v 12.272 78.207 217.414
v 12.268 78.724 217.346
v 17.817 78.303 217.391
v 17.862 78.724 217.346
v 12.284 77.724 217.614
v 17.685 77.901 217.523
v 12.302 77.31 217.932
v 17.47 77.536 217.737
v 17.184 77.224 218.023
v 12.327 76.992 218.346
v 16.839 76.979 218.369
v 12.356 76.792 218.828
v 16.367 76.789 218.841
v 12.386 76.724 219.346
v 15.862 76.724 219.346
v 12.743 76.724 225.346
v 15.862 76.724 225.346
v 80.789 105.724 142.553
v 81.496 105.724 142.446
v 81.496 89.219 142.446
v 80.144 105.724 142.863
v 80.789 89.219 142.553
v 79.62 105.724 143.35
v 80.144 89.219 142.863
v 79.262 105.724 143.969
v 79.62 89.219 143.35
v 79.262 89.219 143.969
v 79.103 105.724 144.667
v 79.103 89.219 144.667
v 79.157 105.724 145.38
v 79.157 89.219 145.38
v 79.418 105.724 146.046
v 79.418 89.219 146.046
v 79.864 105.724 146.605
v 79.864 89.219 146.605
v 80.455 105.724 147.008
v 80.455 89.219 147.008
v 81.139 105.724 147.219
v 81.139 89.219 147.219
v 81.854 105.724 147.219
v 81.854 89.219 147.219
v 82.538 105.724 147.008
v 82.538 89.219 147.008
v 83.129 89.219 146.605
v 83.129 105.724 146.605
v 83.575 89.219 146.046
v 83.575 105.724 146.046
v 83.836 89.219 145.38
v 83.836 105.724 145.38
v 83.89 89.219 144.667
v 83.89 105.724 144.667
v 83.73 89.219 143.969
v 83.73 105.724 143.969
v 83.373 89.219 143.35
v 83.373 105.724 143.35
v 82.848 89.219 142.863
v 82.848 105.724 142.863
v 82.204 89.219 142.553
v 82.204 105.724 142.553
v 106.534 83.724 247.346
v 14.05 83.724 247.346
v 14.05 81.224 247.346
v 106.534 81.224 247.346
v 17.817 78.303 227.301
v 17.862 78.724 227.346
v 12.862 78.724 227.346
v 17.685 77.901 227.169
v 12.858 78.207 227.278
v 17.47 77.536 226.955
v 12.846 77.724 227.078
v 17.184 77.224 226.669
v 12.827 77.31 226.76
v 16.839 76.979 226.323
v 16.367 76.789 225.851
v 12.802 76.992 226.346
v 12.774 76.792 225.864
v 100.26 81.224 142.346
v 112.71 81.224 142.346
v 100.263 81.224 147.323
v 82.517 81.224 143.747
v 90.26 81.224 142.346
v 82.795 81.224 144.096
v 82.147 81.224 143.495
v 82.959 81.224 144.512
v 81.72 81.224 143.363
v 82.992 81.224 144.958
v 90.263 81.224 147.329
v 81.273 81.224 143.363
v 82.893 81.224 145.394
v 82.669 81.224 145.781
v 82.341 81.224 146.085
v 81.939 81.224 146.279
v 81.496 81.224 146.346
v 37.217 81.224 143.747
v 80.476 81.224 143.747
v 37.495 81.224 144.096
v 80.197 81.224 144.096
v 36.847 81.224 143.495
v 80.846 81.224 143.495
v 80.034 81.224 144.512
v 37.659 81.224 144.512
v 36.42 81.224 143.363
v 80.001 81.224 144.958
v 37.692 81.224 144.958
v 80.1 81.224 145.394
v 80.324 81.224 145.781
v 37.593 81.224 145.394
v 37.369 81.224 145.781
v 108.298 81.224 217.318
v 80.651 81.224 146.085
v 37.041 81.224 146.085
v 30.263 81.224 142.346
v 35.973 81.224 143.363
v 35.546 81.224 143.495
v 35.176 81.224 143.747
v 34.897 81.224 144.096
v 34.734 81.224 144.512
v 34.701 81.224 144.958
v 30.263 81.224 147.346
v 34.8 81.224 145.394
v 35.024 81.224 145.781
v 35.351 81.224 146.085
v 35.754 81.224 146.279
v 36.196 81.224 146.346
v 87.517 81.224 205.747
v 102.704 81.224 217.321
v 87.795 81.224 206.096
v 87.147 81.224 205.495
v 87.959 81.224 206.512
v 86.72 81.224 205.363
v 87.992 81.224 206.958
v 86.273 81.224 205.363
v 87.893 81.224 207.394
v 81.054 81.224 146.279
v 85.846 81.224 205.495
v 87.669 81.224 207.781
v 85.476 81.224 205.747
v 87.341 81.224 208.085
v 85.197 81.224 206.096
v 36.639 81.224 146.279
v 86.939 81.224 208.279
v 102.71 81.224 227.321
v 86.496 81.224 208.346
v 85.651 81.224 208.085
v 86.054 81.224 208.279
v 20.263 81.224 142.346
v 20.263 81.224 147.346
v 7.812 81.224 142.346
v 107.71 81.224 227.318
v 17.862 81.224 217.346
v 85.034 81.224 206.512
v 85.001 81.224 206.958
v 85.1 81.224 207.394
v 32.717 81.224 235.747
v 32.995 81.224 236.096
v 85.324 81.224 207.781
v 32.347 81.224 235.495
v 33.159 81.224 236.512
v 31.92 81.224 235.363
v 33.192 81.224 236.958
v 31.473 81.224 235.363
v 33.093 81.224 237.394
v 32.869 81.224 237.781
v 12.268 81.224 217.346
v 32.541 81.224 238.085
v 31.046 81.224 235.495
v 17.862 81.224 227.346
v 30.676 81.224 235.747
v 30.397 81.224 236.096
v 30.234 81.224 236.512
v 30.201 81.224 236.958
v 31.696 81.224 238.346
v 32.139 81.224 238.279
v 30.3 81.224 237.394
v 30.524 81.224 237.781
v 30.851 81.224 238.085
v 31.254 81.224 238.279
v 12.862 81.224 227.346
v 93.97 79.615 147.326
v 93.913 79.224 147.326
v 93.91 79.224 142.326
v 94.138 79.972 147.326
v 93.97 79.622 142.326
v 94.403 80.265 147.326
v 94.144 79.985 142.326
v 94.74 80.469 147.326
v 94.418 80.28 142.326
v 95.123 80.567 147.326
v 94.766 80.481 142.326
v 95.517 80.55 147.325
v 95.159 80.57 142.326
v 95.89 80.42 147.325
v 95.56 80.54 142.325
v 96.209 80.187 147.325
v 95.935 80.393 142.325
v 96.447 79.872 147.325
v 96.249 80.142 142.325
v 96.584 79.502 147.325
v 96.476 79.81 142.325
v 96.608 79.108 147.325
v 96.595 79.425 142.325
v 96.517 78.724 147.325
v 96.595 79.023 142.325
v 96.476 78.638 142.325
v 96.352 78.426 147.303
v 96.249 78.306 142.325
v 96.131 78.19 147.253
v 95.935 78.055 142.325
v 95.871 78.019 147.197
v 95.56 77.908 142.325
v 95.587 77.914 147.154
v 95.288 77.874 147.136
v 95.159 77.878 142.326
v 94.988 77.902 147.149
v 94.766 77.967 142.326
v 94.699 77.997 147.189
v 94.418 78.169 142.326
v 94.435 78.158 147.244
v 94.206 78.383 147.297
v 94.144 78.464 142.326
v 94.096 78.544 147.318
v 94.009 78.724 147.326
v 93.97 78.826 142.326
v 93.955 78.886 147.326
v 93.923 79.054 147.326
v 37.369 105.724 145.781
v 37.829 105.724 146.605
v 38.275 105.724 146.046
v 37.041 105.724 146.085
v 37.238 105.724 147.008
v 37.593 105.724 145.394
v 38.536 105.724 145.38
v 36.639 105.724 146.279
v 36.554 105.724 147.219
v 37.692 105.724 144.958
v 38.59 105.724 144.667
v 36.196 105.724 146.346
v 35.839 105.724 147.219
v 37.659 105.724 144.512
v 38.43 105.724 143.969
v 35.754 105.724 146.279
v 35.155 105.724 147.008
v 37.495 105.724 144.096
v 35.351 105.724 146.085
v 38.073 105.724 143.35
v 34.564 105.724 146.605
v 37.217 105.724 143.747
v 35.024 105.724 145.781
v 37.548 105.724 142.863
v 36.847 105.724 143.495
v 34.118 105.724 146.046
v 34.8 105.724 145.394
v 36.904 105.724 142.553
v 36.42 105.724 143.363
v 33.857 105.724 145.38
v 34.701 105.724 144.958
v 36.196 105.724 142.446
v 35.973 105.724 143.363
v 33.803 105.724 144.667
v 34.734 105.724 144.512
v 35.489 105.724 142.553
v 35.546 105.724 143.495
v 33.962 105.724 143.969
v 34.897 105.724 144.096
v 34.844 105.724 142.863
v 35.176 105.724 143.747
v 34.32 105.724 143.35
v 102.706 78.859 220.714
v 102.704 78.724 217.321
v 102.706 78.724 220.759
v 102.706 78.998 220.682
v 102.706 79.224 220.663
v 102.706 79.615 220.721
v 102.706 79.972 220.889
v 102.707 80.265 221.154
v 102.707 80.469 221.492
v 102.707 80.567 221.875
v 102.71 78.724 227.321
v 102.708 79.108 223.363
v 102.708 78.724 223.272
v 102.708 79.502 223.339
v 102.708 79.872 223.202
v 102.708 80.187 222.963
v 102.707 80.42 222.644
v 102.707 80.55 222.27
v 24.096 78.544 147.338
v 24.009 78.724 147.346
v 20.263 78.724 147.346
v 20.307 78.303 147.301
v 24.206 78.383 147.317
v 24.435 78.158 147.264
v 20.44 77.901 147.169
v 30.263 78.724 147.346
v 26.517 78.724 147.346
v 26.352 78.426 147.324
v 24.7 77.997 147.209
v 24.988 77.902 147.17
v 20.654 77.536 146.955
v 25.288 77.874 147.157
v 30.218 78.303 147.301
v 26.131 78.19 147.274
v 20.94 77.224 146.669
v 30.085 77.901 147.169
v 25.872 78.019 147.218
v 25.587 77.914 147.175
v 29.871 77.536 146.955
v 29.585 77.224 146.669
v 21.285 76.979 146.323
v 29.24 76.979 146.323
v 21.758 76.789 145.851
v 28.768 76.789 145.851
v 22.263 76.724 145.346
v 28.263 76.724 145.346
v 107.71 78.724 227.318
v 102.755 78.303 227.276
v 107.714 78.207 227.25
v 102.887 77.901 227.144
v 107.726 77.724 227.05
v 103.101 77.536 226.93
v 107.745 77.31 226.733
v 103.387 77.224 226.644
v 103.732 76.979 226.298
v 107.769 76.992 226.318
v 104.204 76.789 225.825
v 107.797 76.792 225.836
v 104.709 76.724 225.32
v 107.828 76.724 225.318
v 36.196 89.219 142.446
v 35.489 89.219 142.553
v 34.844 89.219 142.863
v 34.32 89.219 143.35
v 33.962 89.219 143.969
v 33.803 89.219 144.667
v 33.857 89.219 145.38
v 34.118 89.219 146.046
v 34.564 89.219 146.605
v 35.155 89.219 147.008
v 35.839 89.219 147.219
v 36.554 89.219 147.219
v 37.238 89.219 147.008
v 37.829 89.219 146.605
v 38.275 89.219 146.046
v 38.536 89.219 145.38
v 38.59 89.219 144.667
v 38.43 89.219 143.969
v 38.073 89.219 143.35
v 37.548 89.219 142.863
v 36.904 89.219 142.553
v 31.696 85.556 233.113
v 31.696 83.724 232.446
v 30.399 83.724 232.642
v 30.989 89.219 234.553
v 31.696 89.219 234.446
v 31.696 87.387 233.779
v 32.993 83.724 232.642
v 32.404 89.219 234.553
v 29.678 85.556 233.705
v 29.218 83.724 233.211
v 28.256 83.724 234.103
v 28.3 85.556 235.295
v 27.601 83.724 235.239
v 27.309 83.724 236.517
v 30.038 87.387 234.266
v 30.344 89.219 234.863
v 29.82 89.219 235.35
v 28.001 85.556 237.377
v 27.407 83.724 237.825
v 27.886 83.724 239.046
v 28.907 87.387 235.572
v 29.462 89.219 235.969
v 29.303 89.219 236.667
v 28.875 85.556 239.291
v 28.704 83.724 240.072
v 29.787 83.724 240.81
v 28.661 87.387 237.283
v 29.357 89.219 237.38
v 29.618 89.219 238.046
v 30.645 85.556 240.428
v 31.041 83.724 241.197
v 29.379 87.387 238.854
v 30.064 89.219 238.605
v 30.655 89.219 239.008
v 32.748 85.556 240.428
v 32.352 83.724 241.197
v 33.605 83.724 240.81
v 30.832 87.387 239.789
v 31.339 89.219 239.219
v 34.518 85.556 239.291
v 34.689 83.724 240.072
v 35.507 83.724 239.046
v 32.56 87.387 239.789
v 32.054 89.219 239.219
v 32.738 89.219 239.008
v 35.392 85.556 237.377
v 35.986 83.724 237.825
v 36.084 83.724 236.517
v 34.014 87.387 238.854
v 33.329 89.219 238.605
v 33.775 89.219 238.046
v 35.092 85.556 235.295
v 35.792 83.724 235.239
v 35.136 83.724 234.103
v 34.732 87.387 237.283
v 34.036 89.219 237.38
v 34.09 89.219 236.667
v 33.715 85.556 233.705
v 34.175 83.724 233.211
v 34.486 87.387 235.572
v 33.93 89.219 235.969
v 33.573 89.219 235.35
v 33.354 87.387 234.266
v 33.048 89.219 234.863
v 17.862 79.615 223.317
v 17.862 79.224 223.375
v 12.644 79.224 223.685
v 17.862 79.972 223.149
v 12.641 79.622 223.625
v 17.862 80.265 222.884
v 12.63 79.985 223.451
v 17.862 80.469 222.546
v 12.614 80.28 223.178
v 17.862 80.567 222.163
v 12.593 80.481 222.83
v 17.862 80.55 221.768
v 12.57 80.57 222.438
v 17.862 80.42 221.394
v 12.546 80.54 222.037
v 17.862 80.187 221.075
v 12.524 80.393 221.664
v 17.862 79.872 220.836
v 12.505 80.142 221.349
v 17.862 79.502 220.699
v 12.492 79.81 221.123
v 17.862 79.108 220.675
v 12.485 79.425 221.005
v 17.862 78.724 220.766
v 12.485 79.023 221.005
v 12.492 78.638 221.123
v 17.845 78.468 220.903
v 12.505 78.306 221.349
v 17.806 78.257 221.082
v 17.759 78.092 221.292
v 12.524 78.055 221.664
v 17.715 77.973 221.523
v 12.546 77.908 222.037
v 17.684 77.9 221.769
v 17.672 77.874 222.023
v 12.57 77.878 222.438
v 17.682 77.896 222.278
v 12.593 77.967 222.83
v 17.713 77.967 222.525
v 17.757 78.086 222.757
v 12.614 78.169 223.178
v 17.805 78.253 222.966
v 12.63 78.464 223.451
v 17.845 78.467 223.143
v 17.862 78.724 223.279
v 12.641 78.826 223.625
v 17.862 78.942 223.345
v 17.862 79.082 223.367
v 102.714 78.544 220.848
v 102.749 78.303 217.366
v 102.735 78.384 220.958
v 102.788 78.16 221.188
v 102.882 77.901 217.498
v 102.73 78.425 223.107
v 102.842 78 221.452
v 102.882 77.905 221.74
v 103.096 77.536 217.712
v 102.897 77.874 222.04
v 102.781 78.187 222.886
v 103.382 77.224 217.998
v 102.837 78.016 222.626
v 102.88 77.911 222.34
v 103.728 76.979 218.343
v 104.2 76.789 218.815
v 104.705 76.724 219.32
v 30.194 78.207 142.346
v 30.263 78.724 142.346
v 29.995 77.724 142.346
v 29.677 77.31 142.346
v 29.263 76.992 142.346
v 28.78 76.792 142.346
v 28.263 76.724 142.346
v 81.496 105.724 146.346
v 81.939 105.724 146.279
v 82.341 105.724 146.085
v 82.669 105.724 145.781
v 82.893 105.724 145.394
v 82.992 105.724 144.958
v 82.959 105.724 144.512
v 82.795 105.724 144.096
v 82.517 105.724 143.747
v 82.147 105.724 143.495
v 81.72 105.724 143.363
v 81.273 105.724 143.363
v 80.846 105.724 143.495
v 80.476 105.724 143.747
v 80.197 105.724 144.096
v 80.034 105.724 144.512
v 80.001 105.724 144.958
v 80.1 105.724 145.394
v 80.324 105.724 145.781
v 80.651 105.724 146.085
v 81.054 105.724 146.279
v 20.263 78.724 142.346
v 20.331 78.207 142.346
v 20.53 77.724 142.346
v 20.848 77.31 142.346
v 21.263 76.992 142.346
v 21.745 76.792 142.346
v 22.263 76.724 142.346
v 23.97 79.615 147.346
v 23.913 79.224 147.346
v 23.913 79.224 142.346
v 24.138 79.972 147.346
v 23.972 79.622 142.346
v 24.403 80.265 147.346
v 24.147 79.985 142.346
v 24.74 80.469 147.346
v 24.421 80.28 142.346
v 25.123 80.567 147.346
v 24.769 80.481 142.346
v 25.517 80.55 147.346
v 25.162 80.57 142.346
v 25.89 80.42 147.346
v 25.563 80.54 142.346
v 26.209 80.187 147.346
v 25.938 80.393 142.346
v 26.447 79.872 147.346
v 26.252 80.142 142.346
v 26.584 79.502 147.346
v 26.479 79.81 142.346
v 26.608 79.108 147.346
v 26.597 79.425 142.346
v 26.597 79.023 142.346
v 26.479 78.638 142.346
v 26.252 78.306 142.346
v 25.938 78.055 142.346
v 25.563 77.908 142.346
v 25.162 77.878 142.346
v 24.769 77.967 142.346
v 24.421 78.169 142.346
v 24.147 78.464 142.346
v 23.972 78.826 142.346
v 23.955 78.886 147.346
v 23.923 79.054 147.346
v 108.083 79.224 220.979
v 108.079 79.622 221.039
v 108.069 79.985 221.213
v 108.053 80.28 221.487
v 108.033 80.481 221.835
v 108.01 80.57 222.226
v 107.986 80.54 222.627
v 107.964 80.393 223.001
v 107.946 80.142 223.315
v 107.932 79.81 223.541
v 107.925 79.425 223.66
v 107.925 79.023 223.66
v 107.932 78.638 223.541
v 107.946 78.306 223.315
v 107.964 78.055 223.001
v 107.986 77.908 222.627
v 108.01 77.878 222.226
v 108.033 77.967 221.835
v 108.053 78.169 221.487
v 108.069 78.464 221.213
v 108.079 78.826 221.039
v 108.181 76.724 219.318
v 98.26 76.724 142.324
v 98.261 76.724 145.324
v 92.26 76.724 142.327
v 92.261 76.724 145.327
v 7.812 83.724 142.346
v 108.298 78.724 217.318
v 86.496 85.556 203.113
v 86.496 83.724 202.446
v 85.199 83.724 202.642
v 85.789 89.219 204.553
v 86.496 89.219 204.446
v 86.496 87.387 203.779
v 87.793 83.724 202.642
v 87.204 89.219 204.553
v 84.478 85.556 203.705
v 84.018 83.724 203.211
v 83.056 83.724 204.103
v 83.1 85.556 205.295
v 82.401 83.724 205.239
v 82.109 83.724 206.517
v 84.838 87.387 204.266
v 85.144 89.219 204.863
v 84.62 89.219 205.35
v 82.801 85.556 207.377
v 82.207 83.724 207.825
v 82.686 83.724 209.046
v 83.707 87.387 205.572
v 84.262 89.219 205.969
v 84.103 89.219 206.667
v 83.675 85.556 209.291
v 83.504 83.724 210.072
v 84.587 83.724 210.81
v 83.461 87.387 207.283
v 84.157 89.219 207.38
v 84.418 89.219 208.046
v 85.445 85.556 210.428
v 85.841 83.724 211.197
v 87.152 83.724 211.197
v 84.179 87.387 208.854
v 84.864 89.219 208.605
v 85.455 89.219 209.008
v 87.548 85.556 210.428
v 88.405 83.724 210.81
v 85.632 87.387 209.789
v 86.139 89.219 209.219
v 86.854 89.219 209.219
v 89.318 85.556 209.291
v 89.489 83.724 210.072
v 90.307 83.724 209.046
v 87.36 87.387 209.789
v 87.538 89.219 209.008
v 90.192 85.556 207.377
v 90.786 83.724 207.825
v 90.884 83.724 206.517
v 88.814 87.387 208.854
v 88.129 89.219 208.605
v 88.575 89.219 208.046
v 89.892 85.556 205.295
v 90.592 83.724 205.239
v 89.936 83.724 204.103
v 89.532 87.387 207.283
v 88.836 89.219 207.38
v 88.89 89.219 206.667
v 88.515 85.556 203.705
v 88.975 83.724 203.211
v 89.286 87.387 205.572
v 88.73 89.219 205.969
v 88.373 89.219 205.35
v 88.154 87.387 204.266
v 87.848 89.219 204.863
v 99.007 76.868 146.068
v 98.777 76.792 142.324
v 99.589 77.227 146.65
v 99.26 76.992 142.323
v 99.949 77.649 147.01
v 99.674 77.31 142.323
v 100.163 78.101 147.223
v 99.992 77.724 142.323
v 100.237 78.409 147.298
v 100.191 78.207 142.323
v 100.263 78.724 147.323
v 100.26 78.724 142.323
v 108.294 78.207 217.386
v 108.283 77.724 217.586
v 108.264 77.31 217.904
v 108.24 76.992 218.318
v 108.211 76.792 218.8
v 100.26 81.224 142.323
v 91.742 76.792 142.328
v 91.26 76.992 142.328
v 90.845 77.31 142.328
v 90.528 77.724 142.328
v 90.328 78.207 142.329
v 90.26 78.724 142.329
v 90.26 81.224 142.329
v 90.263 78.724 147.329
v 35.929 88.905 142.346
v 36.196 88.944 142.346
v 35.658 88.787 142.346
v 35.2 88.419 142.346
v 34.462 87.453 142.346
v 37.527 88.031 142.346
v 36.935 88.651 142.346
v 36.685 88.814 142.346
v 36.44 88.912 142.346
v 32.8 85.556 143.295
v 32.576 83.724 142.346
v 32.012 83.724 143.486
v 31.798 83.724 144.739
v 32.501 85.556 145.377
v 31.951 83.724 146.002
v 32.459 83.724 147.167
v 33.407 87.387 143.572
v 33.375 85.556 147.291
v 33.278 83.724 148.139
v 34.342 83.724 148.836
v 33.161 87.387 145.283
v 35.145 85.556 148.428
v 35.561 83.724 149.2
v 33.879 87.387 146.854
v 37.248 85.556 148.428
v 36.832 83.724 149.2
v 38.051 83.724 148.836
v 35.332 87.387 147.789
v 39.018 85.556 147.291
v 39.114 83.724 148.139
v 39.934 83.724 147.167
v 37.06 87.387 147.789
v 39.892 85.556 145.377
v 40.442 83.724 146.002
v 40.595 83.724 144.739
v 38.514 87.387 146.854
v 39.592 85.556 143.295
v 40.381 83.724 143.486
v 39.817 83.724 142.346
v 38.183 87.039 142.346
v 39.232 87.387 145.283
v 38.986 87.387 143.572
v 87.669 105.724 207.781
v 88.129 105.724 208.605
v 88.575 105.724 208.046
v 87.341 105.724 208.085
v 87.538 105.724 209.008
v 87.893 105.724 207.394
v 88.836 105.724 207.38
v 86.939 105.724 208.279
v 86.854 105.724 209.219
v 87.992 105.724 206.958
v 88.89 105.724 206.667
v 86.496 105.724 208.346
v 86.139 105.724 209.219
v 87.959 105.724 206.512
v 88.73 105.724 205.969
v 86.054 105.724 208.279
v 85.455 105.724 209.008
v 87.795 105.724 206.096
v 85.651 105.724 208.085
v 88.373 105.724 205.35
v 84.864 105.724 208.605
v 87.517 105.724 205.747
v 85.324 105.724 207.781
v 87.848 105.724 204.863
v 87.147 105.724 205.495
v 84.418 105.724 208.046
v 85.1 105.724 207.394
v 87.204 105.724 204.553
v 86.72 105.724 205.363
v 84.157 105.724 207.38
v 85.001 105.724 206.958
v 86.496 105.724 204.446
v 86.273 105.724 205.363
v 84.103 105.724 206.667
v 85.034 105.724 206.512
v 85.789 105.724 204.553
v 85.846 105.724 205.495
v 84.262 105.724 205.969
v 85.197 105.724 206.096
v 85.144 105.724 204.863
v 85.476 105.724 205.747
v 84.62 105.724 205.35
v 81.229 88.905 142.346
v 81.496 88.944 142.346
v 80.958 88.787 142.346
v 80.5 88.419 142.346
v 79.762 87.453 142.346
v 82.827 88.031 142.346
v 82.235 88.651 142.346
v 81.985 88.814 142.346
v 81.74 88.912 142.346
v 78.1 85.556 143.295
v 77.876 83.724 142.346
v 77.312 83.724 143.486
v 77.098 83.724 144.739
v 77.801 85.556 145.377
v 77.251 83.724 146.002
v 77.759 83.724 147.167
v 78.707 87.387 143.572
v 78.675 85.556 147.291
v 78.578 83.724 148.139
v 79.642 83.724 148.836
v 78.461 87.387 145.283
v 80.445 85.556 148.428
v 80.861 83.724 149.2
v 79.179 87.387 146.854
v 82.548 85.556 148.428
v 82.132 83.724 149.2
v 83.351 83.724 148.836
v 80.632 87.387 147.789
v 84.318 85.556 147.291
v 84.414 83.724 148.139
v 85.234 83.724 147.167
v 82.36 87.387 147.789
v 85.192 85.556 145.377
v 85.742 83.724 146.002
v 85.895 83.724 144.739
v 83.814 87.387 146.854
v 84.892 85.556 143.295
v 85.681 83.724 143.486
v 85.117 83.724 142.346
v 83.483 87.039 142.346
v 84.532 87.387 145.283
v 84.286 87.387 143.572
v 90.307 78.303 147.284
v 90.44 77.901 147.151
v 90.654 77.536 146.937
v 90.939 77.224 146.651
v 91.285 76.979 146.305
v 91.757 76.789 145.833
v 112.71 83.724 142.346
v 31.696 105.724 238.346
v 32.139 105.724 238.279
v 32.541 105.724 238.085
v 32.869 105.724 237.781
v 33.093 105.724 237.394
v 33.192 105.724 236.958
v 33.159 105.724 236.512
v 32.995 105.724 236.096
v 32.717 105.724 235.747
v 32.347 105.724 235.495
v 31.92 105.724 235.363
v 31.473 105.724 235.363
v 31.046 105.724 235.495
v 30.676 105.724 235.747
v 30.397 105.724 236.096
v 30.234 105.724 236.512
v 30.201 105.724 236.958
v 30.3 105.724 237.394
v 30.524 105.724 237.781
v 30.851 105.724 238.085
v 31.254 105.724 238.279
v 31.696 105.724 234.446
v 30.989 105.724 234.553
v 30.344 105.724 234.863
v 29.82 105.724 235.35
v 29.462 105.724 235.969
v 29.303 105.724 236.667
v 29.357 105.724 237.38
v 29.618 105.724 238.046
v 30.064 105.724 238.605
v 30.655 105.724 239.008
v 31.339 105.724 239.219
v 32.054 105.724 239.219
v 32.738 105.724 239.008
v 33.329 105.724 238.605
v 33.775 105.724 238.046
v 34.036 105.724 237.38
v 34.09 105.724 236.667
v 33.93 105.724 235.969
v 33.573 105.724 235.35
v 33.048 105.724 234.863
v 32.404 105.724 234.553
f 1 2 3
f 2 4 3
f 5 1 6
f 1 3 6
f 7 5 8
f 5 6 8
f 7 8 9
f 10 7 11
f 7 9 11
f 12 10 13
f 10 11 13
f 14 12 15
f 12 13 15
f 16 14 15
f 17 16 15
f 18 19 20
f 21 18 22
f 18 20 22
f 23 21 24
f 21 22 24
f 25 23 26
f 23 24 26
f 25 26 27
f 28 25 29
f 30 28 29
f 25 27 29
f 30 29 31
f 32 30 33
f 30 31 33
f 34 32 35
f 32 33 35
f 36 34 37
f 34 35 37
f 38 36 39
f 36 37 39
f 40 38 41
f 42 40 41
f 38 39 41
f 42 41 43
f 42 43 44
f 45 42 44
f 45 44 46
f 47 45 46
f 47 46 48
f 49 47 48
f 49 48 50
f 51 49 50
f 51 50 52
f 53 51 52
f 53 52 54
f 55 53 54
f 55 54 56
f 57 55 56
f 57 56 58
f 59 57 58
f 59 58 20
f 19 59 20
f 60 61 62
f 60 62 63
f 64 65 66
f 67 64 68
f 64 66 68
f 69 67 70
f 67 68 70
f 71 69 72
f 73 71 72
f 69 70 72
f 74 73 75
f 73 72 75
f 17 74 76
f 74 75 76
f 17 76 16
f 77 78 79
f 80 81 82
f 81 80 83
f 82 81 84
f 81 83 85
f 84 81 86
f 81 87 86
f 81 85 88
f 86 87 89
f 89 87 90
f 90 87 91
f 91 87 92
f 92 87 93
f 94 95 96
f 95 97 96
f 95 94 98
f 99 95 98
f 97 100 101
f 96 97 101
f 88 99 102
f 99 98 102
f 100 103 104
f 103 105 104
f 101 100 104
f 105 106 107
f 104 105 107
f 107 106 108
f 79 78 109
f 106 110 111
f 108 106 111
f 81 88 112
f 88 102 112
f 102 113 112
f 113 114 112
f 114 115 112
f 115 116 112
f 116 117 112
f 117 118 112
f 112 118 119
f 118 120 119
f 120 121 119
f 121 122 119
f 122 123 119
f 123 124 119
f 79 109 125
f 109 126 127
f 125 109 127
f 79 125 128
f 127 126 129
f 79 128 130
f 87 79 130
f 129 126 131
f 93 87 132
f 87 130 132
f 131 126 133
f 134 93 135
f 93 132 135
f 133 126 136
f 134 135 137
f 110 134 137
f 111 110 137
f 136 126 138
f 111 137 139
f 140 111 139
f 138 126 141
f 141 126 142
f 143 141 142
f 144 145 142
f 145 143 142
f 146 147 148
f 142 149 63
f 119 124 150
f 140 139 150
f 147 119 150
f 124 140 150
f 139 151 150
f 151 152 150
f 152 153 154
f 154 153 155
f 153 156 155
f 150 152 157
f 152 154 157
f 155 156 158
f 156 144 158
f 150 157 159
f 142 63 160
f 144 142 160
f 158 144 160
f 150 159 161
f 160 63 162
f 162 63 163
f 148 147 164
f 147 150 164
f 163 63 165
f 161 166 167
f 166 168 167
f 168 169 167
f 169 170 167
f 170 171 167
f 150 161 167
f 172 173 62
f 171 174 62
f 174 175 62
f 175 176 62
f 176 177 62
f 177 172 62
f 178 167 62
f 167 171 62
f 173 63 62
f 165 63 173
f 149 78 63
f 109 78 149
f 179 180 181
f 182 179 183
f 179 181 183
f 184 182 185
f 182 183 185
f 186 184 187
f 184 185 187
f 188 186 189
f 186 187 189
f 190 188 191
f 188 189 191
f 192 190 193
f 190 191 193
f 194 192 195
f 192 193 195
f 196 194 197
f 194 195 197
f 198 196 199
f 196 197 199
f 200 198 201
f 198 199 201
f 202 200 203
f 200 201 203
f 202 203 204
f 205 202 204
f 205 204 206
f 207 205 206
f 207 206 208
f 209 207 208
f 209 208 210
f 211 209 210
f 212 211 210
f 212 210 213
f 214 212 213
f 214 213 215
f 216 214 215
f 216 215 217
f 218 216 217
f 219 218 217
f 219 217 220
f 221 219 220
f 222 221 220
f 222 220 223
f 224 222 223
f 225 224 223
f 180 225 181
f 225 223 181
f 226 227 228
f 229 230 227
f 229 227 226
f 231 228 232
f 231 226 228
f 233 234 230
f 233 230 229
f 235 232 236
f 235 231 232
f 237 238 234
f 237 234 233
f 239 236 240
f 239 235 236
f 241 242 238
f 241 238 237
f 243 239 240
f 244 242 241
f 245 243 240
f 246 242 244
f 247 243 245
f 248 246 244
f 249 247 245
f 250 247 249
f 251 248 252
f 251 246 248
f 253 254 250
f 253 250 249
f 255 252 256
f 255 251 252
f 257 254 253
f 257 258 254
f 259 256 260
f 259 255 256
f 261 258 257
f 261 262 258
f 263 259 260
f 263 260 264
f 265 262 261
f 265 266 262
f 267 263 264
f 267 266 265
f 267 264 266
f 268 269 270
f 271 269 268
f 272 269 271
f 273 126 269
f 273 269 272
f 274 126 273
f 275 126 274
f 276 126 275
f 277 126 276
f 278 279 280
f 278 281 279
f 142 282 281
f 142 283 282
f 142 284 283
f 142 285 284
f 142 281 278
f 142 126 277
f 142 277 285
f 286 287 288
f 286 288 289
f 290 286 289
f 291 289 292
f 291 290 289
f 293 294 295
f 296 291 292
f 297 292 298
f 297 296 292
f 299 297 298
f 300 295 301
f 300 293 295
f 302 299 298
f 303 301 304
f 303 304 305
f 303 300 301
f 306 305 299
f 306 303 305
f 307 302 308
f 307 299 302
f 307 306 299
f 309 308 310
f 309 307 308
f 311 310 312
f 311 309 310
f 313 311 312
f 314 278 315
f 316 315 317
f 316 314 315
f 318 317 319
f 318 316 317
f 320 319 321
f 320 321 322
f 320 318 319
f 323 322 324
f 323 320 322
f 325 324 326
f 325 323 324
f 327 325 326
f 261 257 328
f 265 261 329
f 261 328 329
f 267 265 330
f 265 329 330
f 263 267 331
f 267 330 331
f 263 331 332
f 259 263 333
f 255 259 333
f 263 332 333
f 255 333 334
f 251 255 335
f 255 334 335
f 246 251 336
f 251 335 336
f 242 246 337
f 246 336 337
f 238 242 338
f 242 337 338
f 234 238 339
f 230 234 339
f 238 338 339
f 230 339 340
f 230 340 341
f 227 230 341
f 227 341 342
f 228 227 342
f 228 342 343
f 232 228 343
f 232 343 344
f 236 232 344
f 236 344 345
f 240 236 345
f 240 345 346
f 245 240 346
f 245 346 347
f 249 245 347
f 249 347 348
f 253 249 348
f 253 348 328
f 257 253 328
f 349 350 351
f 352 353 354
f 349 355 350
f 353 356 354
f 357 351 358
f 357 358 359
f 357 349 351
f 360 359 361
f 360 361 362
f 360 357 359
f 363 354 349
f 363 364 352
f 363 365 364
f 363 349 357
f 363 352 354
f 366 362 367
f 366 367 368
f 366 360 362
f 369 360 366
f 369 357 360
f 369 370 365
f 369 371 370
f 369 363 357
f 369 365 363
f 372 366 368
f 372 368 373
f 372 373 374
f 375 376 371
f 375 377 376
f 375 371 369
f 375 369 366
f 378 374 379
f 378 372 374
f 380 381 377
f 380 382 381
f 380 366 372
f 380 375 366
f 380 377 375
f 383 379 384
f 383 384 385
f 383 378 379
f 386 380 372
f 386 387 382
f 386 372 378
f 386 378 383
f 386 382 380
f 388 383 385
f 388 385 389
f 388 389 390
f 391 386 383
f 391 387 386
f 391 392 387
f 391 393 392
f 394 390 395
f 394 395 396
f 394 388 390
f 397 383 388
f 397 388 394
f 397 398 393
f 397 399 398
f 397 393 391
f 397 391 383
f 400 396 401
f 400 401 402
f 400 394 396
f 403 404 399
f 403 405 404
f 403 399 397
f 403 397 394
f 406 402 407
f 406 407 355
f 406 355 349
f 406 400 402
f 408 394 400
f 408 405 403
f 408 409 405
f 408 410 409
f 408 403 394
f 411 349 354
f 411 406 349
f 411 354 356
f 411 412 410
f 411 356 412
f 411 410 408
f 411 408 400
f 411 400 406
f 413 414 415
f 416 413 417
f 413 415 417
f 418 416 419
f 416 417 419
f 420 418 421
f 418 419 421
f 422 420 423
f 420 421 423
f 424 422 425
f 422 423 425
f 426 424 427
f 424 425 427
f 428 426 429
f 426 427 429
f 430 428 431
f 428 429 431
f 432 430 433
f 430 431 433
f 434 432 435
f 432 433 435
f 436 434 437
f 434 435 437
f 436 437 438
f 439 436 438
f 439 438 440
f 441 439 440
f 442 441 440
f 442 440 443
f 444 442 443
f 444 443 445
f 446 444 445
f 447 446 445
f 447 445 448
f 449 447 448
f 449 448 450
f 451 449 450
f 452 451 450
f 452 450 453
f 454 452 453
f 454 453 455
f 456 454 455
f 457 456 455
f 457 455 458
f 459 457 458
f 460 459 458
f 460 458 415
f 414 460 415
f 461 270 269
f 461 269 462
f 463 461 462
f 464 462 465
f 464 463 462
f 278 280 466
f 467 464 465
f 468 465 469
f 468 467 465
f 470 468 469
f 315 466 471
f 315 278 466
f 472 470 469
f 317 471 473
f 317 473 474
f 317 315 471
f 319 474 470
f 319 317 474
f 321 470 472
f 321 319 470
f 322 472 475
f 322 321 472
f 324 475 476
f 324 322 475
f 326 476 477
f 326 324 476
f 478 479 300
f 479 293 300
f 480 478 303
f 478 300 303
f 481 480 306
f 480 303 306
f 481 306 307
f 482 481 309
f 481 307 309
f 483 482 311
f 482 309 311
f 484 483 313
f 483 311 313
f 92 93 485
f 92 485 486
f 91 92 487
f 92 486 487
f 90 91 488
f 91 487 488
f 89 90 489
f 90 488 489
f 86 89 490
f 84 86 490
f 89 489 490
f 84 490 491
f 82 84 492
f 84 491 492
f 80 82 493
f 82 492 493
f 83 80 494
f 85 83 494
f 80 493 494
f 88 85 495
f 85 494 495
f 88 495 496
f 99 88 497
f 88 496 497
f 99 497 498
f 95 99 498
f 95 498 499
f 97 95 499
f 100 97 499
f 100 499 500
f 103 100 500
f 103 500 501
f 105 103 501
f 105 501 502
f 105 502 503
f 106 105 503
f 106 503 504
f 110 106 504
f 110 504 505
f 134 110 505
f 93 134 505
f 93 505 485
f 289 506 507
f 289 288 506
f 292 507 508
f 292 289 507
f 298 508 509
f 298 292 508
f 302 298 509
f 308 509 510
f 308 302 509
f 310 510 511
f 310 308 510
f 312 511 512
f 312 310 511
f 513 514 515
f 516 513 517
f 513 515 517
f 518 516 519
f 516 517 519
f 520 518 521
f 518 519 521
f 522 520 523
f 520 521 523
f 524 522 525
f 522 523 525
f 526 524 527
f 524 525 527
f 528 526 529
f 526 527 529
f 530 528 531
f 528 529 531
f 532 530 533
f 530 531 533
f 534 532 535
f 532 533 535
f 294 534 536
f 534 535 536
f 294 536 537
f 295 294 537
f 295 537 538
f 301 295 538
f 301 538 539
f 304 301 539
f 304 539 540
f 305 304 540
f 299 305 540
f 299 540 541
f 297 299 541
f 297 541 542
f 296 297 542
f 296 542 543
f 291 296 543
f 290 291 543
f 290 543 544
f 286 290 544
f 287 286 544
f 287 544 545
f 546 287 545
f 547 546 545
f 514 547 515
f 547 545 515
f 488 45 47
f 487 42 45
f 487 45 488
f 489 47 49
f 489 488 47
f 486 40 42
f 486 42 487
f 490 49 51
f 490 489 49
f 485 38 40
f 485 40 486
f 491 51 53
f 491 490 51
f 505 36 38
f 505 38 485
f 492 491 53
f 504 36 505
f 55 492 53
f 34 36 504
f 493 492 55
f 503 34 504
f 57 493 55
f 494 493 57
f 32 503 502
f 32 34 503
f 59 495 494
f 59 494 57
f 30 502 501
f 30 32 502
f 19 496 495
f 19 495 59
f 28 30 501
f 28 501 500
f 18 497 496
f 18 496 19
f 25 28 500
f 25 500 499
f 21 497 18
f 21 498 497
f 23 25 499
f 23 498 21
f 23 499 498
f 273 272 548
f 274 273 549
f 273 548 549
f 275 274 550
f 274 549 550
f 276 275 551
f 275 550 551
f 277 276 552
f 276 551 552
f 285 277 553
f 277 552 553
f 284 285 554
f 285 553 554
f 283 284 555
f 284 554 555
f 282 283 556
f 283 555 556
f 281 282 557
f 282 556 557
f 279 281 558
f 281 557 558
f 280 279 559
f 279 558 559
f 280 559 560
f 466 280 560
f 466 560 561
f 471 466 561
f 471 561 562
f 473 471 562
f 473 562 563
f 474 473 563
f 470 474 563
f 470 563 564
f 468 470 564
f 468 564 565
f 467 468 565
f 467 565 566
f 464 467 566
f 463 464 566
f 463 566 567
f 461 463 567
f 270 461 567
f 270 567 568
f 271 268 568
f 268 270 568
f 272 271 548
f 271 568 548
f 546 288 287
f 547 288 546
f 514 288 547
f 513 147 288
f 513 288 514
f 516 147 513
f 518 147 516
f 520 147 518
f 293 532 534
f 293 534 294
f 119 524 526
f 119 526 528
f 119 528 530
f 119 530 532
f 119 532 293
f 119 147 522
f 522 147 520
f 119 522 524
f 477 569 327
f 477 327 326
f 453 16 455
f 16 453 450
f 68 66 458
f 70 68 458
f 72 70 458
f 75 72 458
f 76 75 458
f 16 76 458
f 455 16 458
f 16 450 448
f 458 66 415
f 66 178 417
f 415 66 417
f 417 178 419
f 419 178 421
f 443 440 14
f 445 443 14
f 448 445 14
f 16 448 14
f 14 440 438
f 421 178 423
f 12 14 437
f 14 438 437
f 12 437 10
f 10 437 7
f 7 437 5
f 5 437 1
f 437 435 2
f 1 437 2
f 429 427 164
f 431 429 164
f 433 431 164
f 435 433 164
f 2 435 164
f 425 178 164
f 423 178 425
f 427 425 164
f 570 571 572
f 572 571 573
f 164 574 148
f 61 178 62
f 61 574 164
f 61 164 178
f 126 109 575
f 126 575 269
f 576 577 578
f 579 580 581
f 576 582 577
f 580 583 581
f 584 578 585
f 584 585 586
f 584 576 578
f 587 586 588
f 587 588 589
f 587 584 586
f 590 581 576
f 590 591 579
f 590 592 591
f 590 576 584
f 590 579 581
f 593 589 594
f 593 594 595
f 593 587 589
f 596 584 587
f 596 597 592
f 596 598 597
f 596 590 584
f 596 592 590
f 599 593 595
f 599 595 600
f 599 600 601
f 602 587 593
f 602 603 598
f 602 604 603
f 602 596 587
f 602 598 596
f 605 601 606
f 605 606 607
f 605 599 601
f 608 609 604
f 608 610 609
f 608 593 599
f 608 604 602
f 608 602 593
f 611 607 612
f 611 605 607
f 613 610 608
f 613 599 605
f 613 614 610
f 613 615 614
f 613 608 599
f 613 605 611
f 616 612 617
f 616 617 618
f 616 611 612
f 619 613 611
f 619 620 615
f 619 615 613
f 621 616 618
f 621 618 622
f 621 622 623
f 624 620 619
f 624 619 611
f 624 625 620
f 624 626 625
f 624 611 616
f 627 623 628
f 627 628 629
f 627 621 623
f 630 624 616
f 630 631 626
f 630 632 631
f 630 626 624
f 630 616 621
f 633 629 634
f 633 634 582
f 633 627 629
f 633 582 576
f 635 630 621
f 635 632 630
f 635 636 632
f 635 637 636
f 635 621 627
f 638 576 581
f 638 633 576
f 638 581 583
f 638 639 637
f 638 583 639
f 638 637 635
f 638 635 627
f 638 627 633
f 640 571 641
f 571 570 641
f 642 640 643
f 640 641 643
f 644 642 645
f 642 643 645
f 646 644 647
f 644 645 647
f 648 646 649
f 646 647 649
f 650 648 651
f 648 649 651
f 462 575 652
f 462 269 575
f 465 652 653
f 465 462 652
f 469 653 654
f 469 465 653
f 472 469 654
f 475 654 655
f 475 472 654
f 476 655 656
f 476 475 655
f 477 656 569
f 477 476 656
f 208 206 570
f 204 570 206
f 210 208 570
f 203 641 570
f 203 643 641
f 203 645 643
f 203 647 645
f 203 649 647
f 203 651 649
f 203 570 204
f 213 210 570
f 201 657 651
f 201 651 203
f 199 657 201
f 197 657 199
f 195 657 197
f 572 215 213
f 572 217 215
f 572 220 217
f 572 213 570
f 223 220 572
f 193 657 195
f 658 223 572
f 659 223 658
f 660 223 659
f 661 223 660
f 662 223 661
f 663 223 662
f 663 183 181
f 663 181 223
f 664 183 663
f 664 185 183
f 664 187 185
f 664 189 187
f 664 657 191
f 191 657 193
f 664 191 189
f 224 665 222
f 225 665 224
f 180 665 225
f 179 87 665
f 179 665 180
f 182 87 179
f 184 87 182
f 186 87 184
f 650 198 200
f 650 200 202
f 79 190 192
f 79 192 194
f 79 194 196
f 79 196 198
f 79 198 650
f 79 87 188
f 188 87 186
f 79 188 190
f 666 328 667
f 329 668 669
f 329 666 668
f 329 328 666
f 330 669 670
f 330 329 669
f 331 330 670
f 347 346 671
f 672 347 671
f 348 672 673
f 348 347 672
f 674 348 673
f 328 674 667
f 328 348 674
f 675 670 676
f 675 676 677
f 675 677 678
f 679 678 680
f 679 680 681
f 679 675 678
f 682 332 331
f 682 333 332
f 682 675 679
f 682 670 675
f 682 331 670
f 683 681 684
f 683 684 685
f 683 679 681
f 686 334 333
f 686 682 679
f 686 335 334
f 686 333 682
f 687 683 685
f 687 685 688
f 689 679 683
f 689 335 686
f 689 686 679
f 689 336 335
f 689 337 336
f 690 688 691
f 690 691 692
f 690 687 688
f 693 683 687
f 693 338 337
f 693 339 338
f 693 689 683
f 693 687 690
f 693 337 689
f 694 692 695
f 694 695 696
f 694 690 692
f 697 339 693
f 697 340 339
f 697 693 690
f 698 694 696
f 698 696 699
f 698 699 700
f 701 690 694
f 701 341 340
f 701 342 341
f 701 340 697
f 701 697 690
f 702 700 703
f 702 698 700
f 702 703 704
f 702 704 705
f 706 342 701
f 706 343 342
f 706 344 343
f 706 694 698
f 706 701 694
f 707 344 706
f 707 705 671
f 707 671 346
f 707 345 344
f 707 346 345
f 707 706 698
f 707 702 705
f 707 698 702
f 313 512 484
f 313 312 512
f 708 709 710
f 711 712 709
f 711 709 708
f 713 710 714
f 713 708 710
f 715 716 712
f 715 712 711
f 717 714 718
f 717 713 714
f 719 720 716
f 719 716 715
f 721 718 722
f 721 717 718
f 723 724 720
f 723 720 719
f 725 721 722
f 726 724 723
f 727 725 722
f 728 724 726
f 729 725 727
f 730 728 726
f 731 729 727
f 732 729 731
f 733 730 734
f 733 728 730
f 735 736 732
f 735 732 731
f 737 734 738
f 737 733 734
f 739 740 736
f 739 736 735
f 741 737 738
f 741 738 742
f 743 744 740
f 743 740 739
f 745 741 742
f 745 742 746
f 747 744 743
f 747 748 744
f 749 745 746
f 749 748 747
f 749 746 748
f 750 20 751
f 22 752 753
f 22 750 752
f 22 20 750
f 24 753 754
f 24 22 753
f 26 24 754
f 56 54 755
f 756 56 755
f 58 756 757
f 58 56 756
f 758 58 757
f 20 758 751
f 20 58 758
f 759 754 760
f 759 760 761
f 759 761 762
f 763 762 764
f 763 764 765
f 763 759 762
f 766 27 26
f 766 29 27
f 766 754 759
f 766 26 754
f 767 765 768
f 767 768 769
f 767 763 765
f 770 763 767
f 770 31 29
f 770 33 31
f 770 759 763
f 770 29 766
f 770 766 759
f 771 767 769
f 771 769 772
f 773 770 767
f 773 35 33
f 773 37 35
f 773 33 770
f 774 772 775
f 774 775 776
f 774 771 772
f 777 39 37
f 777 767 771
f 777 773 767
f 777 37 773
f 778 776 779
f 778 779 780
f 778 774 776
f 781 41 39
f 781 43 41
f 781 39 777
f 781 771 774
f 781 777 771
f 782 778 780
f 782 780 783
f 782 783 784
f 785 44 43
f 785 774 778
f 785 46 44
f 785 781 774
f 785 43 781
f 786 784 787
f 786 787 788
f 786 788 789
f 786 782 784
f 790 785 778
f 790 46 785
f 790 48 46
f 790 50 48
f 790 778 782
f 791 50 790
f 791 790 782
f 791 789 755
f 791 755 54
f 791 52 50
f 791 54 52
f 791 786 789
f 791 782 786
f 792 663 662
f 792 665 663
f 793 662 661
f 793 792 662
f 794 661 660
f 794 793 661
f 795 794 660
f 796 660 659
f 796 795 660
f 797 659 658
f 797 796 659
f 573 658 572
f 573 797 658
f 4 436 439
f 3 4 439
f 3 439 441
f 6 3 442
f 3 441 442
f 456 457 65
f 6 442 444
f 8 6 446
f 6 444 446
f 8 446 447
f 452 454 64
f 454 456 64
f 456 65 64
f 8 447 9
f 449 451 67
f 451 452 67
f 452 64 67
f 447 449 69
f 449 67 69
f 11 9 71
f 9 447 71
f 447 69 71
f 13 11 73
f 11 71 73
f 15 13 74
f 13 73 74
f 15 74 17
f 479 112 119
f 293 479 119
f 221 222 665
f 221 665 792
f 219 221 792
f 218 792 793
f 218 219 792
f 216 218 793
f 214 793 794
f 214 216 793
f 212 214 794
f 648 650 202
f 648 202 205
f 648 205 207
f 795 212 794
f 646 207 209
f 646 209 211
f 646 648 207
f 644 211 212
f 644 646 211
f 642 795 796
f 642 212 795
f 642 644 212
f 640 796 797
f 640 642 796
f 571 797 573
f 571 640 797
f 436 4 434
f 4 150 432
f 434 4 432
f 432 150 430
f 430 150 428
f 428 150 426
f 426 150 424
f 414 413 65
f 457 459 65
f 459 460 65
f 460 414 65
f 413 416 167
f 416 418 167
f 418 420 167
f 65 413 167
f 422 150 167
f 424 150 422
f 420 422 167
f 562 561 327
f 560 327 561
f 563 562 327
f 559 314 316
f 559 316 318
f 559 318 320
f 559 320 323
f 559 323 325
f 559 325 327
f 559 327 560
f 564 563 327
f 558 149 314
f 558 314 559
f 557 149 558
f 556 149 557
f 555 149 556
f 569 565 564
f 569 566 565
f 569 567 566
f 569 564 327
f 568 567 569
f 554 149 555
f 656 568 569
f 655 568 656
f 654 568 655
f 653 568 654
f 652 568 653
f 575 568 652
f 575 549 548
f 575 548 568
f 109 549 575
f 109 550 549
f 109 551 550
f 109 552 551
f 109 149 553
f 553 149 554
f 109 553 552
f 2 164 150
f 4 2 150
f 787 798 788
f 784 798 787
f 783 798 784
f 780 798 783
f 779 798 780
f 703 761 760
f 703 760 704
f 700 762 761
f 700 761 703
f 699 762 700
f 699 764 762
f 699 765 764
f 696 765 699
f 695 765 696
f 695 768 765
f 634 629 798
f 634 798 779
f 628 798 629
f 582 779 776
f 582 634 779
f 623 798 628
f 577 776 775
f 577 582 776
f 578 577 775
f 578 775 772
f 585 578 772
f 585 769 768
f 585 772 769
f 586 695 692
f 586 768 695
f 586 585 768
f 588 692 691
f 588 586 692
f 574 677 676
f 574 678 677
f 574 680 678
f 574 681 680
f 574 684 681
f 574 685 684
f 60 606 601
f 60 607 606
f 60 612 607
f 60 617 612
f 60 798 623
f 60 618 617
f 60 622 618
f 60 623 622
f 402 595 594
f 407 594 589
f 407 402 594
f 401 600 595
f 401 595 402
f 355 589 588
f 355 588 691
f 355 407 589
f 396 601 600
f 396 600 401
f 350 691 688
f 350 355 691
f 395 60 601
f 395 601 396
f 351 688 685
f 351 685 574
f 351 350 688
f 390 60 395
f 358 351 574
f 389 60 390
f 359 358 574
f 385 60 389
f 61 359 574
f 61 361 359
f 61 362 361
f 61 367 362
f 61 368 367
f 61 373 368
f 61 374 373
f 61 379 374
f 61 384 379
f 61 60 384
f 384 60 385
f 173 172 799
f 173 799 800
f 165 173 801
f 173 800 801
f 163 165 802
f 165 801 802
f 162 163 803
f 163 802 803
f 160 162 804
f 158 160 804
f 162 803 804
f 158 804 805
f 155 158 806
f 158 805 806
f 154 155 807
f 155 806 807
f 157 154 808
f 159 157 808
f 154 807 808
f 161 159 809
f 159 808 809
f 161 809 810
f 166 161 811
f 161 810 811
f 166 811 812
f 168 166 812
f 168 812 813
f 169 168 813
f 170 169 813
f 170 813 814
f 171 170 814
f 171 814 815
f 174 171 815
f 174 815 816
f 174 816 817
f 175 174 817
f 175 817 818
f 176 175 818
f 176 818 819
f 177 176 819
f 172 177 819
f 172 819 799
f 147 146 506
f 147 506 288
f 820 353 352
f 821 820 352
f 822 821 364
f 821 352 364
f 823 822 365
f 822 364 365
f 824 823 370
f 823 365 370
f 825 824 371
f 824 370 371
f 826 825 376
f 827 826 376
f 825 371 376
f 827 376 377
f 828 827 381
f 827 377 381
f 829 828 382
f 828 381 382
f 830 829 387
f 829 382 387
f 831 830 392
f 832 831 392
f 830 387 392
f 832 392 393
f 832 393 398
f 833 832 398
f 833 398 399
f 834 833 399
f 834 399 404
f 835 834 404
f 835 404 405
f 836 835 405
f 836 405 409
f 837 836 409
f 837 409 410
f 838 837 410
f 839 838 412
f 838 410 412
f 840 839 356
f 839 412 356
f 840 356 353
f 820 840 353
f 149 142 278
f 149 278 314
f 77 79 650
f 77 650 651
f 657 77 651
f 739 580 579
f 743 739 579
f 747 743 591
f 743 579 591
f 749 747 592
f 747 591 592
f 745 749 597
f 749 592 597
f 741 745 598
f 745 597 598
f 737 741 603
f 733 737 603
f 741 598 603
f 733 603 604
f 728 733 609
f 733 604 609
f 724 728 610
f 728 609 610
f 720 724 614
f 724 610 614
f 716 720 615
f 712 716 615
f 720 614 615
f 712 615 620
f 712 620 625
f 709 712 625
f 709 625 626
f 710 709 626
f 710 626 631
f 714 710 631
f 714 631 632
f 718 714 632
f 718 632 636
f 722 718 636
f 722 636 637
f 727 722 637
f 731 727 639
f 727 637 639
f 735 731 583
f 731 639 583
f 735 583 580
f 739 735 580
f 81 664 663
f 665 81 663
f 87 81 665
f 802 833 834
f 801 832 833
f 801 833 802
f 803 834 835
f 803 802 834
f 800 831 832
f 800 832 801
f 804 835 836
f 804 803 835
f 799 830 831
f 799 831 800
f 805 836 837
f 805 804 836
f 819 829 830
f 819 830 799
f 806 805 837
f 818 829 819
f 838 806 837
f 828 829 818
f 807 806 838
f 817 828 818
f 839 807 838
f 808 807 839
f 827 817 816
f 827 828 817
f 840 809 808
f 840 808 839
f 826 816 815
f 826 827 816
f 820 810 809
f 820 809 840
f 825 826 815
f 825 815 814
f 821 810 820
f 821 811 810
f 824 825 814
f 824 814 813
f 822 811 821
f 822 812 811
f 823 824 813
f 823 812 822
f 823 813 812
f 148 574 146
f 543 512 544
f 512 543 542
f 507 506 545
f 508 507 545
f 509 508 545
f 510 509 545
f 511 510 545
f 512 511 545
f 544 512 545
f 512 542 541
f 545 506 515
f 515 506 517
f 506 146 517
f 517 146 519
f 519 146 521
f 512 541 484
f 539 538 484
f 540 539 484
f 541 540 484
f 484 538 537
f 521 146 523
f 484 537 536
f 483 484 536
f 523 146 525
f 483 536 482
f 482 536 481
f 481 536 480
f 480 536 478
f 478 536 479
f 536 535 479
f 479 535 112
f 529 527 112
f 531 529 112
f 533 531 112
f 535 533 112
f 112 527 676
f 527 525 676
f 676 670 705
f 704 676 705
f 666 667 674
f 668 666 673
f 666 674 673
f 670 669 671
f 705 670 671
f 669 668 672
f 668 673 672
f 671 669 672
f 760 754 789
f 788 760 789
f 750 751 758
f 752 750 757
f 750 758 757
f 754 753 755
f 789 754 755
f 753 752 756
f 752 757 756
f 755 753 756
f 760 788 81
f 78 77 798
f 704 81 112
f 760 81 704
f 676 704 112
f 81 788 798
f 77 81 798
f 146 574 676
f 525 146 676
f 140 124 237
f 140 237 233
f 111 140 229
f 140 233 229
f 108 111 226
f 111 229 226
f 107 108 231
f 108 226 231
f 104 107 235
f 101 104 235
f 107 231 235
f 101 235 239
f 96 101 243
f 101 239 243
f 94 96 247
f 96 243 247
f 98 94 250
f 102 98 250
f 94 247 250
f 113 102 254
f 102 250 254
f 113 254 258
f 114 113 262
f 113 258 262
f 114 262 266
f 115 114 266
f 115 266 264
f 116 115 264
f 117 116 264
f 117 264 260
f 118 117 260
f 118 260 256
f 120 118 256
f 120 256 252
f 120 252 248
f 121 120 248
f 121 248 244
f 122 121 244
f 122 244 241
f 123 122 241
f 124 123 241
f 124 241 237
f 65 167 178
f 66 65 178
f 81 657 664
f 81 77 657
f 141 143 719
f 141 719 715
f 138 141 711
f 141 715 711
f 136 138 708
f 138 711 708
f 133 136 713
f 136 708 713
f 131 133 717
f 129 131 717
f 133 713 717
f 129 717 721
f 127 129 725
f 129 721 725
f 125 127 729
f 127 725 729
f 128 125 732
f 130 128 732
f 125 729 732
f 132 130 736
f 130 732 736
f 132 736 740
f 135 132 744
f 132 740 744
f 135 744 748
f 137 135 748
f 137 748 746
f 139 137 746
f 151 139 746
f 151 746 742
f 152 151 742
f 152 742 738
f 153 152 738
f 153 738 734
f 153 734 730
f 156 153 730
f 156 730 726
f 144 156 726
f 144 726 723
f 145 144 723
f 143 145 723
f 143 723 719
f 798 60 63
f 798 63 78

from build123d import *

# Parameters (mm, degrees)
BOSS_EXTRUDE1_START = 40
BOSS_EXTRUDE1_DEPTH = 2.5
SKETCH2_R           = 2.4
BOSS_EXTRUDE2_DEPTH = 22
CUT_EXTRUDE1_START  = 22
SKETCH2_3_R         = 1.5
CUT_EXTRUDE1_DEPTH  = 295.704277162
CHAMFER1_SIZE       = 2
CHAMFER1_SIZE2      = 5.494954839
CHAMFER2_SIZE       = 2
CHAMFER2_SIZE_2     = 5.494954839
SKETCH3_W           = 10
SKETCH3_H           = 5
BOSS_EXTRUDE3_DEPTH = 4.5
FILLET1_R           = 2
CUT_EXTRUDE2_REACH  = 287.714
SKETCH4_R           = 1.35
CUT_EXTRUDE3_REACH  = 293.869
SKETCH5_R           = 1.35
CUT_EXTRUDE4_REACH  = 188.832
SKETCH6_R           = 1.35
CUT_EXTRUDE5_REACH  = 188.762
SKETCH7_R           = 1.35


with BuildPart() as part:
    # Sketch1 → Boss-Extrude1 (new body)
    with BuildSketch(Plane.XZ.offset(-123.724152422).offset(BOSS_EXTRUDE1_START)):
        Polygon((7.812220157, 142.346117951), (14.049843919, 247.346117951), (106.533726398, 247.346117951), (112.70989627, 142.346117951), align=None)
    extrude(amount=BOSS_EXTRUDE1_DEPTH)

    # Sketch2 → Boss-Extrude2 (add)
    with BuildSketch(Plane(origin=(0, 83.724152422, 0), x_dir=(1, 0, 0), z_dir=(0, 1, 0))):
        with Locations(Location((36.196379089, -144.846126643, 0), (0, 0, 90))):
            Circle(SKETCH2_R)
        with Locations(Location((81.496379089, -144.846126643, 0), (0, 0, 90))):
            Circle(SKETCH2_R)
        with Locations(Location((31.696379089, -236.846126643, 0), (0, 0, 90))):
            Circle(SKETCH2_R)
        with Locations(Location((86.496379089, -206.846126643, 0), (0, 0, 90))):
            Circle(SKETCH2_R)
    extrude(amount=BOSS_EXTRUDE2_DEPTH)

    # Sketch2<3> → Cut-Extrude1 (cut, through all)
    with BuildSketch(Plane(origin=(0, 83.724152422, 0), x_dir=(1, 0, 0), z_dir=(0, 1, 0)).offset(CUT_EXTRUDE1_START)):
        with Locations(Location((81.496379089, -144.846126643, 0), (0, 0, 270))):
            Circle(SKETCH2_3_R)
        with Locations(Location((36.196379089, -144.846126643, 0), (0, 0, 270))):
            Circle(SKETCH2_3_R)
        with Locations(Location((86.496379089, -206.846126643, 0), (0, 0, 270))):
            Circle(SKETCH2_3_R)
        with Locations(Location((31.696379089, -236.846126643, 0), (0, 0, 270))):
            Circle(SKETCH2_3_R)
    extrude(amount=-CUT_EXTRUDE1_DEPTH, mode=Mode.SUBTRACT)

    # Chamfer1
    chamfer1_edges = [part.edges().sort_by_distance(p)[0] for p in [
        (86.496379089, 83.724152422, 209.246126643),
        (31.696379089, 83.724152422, 239.246126643),
    ]]
    chamfer1_side = [part.faces().sort_by_distance(p)[0] for p in [
        (60.285277184, 83.724152422, 193.81865211),
    ]]
    chamfer(chamfer1_edges, length=CHAMFER1_SIZE, length2=CHAMFER1_SIZE2, reference=chamfer1_side[0])

    # Chamfer2
    # the kernel refuses this chamfer: 5.494954839, 2 mm, written as the material it adds along each edge
    with BuildSketch(Plane(origin=(36.196379089, 83.724152422, 144.846126643), x_dir=(0, 0, -1), z_dir=(1, 0, 0))) as chamfer2_piece_1_section:
        Polygon((2.4 + CHAMFER2_SIZE, 0), (2.4, CHAMFER2_SIZE_2), (2.4, 0), align=None)
    chamfer2_piece_1 = revolve(axis=Axis((36.196379089, 83.724152422, 144.846126643), (0, 1, 0)), mode=Mode.PRIVATE)
    chamfer2_piece_1 = split(chamfer2_piece_1, bisect_by=Plane(origin=(36.196379089, 86.455650516, 142.346117951), z_dir=(0, 0, 1)), keep=Keep.TOP, mode=Mode.PRIVATE)
    add(chamfer2_piece_1)
    with BuildSketch(Plane(origin=(81.496379089, 83.724152422, 144.846126643), x_dir=(0, 0, -1), z_dir=(1, 0, 0))) as chamfer2_piece_2_section:
        Polygon((2.4 + CHAMFER2_SIZE, 0), (2.4, CHAMFER2_SIZE_2), (2.4, 0), align=None)
    chamfer2_piece_2 = revolve(axis=Axis((81.496379089, 83.724152422, 144.846126643), (0, 1, 0)), mode=Mode.PRIVATE)
    chamfer2_piece_2 = split(chamfer2_piece_2, bisect_by=Plane(origin=(81.496379089, 86.455650516, 142.346117951), z_dir=(0, 0, 1)), keep=Keep.TOP, mode=Mode.PRIVATE)
    add(chamfer2_piece_2)

    # Sketch3 → Boss-Extrude3 (add)
    with BuildSketch(Plane.XZ.offset(-81.224152422)):
        Polygon((12.267665701, 217.346117951), (17.861725107, 217.346117951), (17.861725107, 227.346117951), (12.861725107, 227.346117951), align=None)
        with Locations((25.262521401, 144.846117951)):
            Rectangle(SKETCH3_W, SKETCH3_H)
        Polygon((107.710131584, 227.318361744), (108.298338138, 217.318015768), (102.70427969, 217.321289832), (102.710132441, 227.321288119), align=None)
        Polygon((90.259589888, 142.328560554), (90.262516263, 147.328559698), (100.26251455, 147.322706947), (100.259588175, 142.322707804), align=None)
    extrude(amount=BOSS_EXTRUDE3_DEPTH)

    # Fillet1
    fillet1_edges = [part.edges().sort_by_distance(p)[0] for p in [
        (100.261051363, 76.724152422, 144.822707375),
        (95.262515407, 76.724152422, 147.325633323),
        (90.261053075, 76.724152422, 144.828560126),
        (20.262521401, 76.724152422, 144.846117951),
        (30.262521401, 76.724152422, 144.846117951),
        (25.262521401, 76.724152422, 147.346117951),
        (15.064695404, 76.724152422, 217.346117951),
        (17.861725107, 76.724152422, 222.346117951),
        (15.361725107, 76.724152422, 227.346117951),
        (105.210132013, 76.724152422, 227.319824931),
        (102.707206065, 76.724152422, 222.321288975),
        (105.501308914, 76.724152422, 217.3196528),
    ]]
    fillet(fillet1_edges, radius=FILLET1_R)

    # Sketch4 → Cut-Extrude2 (cut, up to next)
    with BuildSketch(Plane(origin=(120.663233846, 0, 7.097244942), x_dir=(0.05871713825649746, 0, -0.9982746604391837), z_dir=(0.9982746604391838, 0, 0.058717138256497464)), mode=Mode.PRIVATE) as cut_extrude2_sk1:
        with Locations((-215.601729693, 79.224152422)):
            Circle(SKETCH4_R)
    cut_extrude2_tool1 = extrude(cut_extrude2_sk1.sketch, amount=-CUT_EXTRUDE2_REACH, mode=Mode.PRIVATE) & part.part
    add(cut_extrude2_tool1.solids().sort_by_distance((108.003717, 79.224152, 222.326988))[0], mode=Mode.SUBTRACT)

    # Sketch5 → Cut-Extrude3 (cut, up to next)
    with BuildSketch(Plane(origin=(-0.641720197, 0, 0.038121992), x_dir=(0.05930139349204844, 0, 0.9982401237828007), z_dir=(-0.9982401237828007, 0, 0.05930139349204844)), mode=Mode.PRIVATE) as cut_extrude3_sk1:
        with Locations((222.691105358, 79.224152422)):
            Circle(SKETCH5_R)
    cut_extrude3_tool1 = extrude(cut_extrude3_sk1.sketch, amount=-CUT_EXTRUDE3_REACH, mode=Mode.PRIVATE) & part.part
    add(cut_extrude3_tool1.solids().sort_by_distance((12.564173, 79.224152, 222.337319))[0], mode=Mode.SUBTRACT)

    # Sketch6 → Cut-Extrude4 (cut, up to next)
    with BuildSketch(Plane(origin=(0, 0, 142.346117951), x_dir=(-1, 0, 0), z_dir=(0, 0, -1)), mode=Mode.PRIVATE) as cut_extrude4_sk1:
        with Locations((-25.262521401, 79.224152422)):
            Circle(SKETCH6_R)
    cut_extrude4_tool1 = extrude(cut_extrude4_sk1.sketch, amount=-CUT_EXTRUDE4_REACH, mode=Mode.PRIVATE) & part.part
    add(cut_extrude4_tool1.solids().sort_by_distance((25.262521, 79.224152, 142.346118))[0], mode=Mode.SUBTRACT)

    # Sketch7 → Cut-Extrude5 (cut, up to next)
    with BuildSketch(Plane(origin=(0.083332265, 0, 142.381338481), x_dir=(-0.9999998287265196, 0, 0.0005852750905060992), z_dir=(-0.0005852750905060992, 0, -0.9999998287265196)), mode=Mode.PRIVATE) as cut_extrude5_sk1:
        with Locations((-95.176273068, 79.224152422)):
            Circle(SKETCH7_R)
    cut_extrude5_tool1 = extrude(cut_extrude5_sk1.sketch, amount=-CUT_EXTRUDE5_REACH, mode=Mode.PRIVATE) & part.part
    add(cut_extrude5_tool1.solids().sort_by_distance((95.259589, 79.224152, 142.325634))[0], mode=Mode.SUBTRACT)


solid = part.part
